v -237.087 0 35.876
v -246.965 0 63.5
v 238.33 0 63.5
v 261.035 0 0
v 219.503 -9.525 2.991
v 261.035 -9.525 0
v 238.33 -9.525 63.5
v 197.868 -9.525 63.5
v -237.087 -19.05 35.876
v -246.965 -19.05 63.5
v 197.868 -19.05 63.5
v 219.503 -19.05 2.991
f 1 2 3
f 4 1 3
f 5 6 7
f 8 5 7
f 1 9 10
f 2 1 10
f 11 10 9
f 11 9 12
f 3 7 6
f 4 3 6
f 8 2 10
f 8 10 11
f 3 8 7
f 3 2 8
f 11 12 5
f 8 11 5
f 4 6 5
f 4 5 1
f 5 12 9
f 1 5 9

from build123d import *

# Parameters (mm, degrees)
F0_W     = 508
F0_H     = 63.5
F1_DEPTH = 19.05
F3_DEPTH = 50.8
F5_DEPTH = 50.8
F7_DEPTH = 38.1
F9_DEPTH = 38.1


with BuildPart() as f1:
    # F0 (on Front) → F1 (new body)
    with BuildSketch(Plane.XZ):
        with Locations((7.0352284261, 31.75)):
            Rectangle(F0_W, F0_H)
    extrude(amount=F1_DEPTH)

    # F2 (on face) → F3 (cut)
    with BuildSketch(Plane.XZ.offset(19.05)):
        Polygon((-224.2599035735, 0), (-246.9647715739, 63.5), (-246.9647715739, 0), align=None)
    extrude(amount=-F3_DEPTH, mode=Mode.SUBTRACT)

    # F4 (on face) → F5 (cut)
    with BuildSketch(Plane.XZ.offset(19.05)):
        Polygon((261.0352284261, 0), (-237.0874956021, 35.8756586385), (-224.2599035735, 0), align=None)
    extrude(amount=-F5_DEPTH, mode=Mode.SUBTRACT)

    # F6 (on face) → F7 (cut)
    with BuildSketch(Plane.XZ.offset(19.05)):
        Polygon((238.3303604257, 63.5), (261.0352284261, 0), (261.0352284261, 63.5), align=None)
    extrude(amount=-F7_DEPTH, mode=Mode.SUBTRACT)

    # F8 (on face) → F9 (cut)
    with BuildSketch(Plane(origin=(231.445604258, 0, 82.7549904558), x_dir=(0, 1, 0), z_dir=(0.941618337, 0, 0.3366822055))):
        Polygon((-19.05, 40.5242251848), (-19.05, -87.885916413), (-9.525, -87.885916413), (-9.525, 37.3283624649), align=None)
    extrude(amount=-F9_DEPTH, mode=Mode.SUBTRACT)


solid = f1.part
